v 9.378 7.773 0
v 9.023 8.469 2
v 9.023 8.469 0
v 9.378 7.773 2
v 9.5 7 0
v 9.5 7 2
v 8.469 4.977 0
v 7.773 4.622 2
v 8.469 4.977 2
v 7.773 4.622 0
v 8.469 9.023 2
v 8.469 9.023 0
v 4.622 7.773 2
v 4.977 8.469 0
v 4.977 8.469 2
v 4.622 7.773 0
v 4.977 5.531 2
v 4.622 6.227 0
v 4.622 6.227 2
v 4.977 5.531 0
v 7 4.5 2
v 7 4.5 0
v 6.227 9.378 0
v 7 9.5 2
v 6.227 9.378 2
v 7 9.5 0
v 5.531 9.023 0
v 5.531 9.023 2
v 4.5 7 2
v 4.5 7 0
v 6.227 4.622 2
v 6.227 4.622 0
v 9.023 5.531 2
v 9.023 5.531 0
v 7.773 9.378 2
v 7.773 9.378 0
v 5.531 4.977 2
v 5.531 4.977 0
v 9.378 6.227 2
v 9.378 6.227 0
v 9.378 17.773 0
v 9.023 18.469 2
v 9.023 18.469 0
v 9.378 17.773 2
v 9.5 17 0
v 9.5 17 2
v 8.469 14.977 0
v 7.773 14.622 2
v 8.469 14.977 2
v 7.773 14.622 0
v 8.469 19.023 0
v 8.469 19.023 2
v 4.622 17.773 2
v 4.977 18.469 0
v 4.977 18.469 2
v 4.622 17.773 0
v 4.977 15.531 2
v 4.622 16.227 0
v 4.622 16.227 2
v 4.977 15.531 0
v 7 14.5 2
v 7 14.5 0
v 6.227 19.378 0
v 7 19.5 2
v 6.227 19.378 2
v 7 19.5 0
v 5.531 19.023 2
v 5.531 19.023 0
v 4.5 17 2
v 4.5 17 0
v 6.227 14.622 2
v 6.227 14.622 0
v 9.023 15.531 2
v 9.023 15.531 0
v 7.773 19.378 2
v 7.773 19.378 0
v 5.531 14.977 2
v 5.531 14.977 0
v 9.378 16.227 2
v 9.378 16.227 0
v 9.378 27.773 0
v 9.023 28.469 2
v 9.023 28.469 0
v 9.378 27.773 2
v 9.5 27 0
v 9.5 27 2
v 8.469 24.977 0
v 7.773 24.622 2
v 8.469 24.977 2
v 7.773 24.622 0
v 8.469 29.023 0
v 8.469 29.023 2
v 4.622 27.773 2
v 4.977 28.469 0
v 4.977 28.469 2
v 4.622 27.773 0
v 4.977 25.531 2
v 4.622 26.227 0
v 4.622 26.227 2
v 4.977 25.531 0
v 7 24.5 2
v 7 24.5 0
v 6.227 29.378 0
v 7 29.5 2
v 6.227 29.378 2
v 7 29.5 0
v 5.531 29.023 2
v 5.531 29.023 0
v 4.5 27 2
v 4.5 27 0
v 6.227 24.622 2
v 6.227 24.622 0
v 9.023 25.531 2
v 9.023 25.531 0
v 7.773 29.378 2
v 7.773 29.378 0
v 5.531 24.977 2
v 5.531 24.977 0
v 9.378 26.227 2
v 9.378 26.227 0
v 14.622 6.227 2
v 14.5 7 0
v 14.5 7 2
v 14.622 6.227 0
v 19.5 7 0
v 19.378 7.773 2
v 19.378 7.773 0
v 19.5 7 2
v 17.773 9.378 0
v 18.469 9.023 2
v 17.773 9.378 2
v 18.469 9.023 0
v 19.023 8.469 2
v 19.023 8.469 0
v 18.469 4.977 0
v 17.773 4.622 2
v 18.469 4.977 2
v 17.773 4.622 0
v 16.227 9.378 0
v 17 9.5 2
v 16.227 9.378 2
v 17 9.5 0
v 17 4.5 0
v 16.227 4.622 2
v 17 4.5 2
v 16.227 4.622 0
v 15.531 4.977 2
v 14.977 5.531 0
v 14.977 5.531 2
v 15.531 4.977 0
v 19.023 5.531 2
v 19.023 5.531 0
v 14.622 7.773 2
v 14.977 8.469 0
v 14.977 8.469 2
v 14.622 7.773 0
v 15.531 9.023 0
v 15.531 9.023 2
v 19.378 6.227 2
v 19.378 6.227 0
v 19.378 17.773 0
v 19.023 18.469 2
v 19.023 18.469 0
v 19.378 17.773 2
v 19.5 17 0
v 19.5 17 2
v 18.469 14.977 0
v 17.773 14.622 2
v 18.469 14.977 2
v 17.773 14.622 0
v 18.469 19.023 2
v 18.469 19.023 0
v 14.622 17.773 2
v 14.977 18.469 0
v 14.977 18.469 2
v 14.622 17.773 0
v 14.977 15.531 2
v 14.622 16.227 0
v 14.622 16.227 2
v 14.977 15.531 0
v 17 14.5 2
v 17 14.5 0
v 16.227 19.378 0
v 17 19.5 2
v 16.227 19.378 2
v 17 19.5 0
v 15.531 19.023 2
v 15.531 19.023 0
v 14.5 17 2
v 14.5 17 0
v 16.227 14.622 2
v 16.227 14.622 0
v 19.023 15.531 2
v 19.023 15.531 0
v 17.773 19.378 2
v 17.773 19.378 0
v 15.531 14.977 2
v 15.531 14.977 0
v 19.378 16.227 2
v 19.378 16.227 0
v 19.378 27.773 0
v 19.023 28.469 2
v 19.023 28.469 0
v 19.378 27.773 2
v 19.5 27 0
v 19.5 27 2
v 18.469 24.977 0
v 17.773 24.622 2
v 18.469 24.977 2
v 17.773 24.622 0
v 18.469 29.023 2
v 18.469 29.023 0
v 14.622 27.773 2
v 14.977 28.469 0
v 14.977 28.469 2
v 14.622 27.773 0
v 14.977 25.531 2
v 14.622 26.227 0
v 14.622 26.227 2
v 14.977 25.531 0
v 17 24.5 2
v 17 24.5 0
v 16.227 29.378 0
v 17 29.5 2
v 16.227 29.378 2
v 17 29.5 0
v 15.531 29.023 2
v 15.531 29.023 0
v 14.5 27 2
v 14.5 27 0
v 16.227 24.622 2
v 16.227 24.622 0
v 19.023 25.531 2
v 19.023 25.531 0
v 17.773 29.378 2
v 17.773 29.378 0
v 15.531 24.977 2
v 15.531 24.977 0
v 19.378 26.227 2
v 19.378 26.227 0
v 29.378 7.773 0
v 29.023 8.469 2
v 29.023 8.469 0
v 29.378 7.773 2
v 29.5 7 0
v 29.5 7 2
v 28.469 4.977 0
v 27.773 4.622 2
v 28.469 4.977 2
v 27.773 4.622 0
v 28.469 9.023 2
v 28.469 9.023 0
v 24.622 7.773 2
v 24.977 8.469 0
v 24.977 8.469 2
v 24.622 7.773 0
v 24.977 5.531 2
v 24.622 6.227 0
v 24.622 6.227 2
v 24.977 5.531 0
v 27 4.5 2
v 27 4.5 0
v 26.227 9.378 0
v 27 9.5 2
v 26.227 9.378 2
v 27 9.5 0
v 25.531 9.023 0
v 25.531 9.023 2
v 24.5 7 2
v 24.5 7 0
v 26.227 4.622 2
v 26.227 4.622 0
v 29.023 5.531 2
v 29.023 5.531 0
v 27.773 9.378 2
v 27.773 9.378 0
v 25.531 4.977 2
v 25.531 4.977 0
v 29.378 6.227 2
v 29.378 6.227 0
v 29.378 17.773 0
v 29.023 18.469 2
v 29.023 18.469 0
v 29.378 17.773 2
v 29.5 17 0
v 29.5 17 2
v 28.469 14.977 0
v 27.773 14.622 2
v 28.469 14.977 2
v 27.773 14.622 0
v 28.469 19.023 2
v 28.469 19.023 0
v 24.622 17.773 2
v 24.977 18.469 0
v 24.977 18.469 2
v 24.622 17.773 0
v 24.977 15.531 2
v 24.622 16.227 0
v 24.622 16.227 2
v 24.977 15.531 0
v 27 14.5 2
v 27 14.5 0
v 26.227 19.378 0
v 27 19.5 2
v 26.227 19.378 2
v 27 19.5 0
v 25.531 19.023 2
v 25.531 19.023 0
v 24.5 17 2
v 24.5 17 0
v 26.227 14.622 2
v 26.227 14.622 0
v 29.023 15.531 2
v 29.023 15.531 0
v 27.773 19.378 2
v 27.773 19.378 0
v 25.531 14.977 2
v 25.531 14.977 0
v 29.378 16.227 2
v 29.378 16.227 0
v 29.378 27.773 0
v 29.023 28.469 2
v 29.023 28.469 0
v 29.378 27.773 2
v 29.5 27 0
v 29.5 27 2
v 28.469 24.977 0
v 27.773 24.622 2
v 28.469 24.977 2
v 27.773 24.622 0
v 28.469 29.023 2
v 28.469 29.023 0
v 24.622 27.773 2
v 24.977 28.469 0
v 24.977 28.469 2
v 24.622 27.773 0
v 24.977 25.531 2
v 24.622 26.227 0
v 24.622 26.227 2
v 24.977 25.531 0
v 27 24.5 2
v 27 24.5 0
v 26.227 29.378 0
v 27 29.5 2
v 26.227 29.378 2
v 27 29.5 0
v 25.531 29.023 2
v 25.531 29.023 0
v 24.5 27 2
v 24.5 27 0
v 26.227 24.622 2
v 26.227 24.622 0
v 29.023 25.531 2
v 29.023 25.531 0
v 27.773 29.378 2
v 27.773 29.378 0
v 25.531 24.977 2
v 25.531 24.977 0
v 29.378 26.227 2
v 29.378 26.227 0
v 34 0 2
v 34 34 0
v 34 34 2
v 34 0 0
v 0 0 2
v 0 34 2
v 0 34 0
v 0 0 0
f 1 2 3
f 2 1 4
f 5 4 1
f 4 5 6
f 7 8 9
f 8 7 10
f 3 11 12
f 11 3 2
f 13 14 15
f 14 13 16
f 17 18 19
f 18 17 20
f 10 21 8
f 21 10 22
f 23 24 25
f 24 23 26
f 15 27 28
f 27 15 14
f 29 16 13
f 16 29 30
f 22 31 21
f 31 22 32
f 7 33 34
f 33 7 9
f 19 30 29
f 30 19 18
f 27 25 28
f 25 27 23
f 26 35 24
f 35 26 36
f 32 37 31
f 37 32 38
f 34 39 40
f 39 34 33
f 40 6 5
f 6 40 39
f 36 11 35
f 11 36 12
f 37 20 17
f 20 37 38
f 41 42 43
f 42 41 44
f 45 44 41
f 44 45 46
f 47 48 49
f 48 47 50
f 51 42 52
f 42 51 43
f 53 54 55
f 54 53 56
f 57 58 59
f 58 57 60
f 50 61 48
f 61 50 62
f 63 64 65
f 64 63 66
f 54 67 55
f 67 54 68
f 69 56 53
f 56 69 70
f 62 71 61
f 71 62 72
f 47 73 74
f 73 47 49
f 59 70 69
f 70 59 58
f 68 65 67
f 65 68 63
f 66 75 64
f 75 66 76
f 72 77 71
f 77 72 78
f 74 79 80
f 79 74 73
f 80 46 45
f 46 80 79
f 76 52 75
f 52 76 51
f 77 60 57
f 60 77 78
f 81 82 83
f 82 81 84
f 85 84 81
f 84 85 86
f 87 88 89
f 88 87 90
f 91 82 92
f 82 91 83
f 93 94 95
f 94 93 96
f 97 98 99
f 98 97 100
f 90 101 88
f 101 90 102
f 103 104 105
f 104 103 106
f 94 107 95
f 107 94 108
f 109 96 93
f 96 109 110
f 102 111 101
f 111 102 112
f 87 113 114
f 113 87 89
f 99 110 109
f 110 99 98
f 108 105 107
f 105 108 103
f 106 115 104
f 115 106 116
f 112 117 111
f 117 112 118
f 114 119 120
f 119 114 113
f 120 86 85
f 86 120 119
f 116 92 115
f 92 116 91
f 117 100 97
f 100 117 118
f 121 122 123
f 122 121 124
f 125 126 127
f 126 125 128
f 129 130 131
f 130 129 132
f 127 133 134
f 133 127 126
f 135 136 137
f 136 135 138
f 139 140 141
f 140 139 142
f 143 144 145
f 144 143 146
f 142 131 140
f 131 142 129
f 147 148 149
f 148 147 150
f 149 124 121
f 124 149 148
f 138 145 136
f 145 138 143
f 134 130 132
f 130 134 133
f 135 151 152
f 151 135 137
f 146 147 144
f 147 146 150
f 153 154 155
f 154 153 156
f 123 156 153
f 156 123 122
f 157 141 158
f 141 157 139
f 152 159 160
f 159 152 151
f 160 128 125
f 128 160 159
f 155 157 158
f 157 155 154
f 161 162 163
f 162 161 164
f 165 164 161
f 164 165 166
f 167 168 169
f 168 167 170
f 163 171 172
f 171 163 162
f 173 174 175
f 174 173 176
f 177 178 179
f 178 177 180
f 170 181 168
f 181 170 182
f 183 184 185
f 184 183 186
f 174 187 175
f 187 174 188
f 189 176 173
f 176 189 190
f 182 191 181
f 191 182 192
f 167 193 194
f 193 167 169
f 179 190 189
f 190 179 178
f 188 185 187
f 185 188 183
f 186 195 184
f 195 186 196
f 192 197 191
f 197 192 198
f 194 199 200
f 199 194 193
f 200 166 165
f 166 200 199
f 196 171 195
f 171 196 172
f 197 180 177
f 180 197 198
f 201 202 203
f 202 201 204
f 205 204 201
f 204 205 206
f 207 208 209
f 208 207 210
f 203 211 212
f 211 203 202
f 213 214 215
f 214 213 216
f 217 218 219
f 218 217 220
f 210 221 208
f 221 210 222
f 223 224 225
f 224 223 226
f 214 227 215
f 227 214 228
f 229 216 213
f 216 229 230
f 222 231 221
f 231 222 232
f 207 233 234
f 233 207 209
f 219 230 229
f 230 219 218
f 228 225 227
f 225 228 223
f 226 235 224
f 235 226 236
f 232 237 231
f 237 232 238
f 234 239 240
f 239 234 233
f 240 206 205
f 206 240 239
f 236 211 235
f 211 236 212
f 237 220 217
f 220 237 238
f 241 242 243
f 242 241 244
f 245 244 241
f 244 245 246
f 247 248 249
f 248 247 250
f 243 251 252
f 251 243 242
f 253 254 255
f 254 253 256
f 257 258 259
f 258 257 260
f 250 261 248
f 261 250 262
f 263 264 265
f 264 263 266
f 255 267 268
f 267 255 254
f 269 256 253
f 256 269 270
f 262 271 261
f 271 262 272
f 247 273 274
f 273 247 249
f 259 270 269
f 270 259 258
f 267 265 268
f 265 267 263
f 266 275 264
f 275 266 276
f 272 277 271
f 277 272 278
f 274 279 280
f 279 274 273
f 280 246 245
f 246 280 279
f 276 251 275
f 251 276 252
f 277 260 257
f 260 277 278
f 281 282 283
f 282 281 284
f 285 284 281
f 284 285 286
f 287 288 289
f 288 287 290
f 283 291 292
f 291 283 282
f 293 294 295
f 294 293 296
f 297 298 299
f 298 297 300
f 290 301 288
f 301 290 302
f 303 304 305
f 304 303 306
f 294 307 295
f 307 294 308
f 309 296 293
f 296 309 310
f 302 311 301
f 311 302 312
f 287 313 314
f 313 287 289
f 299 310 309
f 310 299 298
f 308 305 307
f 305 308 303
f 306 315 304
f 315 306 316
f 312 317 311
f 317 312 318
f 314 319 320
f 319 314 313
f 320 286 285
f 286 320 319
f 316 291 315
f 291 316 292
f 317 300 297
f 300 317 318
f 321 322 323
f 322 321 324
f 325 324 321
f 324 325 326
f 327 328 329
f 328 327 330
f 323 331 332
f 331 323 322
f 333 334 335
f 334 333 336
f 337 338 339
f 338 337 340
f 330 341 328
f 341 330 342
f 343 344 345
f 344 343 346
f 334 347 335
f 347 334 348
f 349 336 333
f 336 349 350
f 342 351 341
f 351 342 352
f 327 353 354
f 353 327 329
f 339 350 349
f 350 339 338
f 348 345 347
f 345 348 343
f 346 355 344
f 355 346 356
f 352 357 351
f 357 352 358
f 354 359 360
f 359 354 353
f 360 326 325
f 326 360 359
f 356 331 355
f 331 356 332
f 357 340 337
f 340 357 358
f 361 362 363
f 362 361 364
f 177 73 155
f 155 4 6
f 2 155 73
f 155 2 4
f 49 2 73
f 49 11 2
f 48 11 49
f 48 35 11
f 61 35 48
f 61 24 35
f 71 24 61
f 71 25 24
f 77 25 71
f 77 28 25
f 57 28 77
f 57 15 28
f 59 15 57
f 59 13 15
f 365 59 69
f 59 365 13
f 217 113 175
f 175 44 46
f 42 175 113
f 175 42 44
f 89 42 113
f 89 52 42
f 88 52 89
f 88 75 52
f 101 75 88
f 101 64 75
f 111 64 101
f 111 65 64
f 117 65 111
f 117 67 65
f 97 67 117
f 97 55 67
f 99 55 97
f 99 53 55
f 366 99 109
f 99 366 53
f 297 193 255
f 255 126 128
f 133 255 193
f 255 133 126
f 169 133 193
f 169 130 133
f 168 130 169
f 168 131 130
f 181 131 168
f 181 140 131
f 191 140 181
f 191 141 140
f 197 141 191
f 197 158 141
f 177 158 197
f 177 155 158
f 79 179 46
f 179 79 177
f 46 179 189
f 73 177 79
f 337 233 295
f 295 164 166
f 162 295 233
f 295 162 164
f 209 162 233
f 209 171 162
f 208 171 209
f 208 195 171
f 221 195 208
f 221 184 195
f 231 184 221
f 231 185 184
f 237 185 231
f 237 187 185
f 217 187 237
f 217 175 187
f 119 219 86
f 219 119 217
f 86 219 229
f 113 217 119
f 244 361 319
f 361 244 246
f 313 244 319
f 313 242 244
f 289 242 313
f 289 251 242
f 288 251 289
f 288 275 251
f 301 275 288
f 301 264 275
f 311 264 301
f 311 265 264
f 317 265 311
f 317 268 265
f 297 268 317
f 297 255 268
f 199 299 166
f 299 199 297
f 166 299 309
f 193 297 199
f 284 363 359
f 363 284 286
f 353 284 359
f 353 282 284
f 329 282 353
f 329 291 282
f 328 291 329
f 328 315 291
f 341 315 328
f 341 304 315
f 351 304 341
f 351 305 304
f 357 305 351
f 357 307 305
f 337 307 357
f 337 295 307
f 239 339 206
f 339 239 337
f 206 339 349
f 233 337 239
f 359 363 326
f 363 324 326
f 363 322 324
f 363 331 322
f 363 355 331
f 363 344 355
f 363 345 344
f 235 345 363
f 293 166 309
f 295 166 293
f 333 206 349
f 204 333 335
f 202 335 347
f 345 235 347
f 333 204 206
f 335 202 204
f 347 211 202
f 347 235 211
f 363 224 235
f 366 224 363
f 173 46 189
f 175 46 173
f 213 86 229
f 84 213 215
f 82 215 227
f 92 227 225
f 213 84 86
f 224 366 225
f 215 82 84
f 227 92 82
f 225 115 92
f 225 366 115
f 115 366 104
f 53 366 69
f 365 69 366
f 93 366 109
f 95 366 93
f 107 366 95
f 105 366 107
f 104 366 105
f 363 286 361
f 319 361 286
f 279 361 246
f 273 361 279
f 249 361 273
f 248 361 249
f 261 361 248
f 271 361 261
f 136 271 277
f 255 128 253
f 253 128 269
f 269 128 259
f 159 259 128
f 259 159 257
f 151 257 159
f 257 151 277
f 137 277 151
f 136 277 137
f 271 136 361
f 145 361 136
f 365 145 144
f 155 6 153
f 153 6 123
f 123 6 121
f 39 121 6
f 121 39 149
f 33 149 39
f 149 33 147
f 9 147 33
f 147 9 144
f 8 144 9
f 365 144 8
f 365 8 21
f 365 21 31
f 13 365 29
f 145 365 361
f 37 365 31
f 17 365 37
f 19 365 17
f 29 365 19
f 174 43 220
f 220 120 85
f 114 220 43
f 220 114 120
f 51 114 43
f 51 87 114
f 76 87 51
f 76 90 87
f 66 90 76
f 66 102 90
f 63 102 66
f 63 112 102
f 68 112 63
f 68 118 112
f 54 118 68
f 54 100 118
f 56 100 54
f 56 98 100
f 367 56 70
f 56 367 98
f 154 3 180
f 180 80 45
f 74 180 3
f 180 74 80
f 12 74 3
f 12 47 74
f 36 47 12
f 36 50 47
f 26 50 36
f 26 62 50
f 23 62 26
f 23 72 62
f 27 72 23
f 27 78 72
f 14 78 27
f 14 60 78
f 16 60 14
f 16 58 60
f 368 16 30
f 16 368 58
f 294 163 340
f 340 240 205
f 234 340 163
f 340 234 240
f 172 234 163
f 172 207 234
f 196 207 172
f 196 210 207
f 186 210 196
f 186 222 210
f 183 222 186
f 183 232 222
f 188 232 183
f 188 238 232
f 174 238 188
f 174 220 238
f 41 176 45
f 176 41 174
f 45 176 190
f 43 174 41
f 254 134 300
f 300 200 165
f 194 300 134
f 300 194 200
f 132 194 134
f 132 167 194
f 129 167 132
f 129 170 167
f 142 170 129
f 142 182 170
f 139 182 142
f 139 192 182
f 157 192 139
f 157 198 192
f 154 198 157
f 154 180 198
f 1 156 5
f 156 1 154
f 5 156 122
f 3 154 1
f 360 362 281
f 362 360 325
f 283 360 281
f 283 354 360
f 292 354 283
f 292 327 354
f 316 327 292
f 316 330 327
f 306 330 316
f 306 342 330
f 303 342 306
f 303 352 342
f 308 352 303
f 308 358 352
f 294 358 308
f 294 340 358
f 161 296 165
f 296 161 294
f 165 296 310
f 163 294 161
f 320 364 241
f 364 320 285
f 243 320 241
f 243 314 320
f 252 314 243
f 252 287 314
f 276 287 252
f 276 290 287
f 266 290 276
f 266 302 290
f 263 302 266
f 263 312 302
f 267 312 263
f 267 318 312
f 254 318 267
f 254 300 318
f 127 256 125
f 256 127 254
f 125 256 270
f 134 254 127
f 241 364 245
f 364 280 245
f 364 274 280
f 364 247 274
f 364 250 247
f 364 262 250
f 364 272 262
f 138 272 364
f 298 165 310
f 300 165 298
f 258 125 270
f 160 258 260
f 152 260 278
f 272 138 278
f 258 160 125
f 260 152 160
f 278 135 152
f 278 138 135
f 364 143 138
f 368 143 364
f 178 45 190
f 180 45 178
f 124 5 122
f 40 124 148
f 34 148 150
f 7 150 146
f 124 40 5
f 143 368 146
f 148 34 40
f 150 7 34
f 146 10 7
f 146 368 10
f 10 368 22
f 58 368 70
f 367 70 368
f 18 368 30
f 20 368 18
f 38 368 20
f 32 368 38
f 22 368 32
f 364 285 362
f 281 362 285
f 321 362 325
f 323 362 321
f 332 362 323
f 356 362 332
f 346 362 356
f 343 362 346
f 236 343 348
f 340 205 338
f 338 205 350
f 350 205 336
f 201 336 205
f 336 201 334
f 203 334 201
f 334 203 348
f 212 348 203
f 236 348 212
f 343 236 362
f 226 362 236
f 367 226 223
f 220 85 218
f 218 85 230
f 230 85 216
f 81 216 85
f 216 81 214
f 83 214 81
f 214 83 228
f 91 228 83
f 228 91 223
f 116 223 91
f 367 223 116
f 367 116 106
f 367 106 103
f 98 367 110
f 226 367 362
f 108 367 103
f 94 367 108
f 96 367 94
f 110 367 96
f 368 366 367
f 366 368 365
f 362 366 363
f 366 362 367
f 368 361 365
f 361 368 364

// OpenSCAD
$fn=20;

difference()
{
    cube([34,34,2]);
    for( xa=[7:10:30])
    {
        for( ya=[7:10:30])
        {
            translate([xa,ya,-10])
            {
                cylinder(d=5,h=30);
            }
        }
    }
}
